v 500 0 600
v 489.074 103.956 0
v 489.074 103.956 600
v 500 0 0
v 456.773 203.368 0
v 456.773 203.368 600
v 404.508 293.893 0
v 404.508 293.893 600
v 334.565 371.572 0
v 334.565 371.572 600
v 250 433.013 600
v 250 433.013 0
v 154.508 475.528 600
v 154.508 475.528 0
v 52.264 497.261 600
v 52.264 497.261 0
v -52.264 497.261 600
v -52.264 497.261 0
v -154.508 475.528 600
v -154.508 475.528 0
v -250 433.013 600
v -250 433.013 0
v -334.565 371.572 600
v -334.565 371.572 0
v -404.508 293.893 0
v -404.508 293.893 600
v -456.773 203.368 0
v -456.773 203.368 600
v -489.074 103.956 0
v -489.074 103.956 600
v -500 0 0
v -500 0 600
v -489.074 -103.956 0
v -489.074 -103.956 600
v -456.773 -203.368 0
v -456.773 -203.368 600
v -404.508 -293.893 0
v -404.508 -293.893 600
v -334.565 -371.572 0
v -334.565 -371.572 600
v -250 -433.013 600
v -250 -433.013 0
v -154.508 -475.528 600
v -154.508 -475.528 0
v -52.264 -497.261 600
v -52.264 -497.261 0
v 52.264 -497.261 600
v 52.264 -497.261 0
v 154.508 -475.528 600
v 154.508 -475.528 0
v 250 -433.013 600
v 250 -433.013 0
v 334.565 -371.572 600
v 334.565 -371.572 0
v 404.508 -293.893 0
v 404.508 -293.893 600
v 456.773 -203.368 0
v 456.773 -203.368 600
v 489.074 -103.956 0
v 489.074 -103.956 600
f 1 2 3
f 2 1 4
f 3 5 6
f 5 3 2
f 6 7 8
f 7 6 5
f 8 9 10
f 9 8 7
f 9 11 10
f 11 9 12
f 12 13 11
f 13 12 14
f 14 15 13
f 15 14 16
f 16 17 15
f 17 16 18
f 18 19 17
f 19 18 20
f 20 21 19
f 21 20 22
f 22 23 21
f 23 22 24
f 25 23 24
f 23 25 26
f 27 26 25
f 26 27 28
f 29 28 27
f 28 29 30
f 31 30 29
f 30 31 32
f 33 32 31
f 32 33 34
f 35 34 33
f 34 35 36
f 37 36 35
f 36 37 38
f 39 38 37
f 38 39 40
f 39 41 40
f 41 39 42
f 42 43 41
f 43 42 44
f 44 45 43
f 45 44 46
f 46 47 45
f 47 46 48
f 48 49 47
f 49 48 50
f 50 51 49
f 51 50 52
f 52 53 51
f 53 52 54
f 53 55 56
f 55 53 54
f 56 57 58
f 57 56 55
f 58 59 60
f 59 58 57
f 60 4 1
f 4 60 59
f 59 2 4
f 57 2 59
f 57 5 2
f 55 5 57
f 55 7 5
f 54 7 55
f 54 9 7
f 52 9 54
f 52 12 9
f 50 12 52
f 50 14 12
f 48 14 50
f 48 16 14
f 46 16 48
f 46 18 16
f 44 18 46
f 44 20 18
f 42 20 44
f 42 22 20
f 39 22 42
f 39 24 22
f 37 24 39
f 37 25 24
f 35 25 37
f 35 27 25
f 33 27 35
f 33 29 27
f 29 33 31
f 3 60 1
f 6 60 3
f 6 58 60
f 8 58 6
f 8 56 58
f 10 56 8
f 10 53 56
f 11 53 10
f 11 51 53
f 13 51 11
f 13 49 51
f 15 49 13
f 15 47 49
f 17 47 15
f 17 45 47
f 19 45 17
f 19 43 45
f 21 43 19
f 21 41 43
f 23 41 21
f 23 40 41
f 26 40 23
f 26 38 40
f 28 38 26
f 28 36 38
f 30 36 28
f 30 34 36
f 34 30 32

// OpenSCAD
// cylinder_param.scad
// param: r=5, h=15
module param_cyl(r=5, h=15) {
    cylinder(r=500, h=600);
}
param_cyl(r=5, h=15);
